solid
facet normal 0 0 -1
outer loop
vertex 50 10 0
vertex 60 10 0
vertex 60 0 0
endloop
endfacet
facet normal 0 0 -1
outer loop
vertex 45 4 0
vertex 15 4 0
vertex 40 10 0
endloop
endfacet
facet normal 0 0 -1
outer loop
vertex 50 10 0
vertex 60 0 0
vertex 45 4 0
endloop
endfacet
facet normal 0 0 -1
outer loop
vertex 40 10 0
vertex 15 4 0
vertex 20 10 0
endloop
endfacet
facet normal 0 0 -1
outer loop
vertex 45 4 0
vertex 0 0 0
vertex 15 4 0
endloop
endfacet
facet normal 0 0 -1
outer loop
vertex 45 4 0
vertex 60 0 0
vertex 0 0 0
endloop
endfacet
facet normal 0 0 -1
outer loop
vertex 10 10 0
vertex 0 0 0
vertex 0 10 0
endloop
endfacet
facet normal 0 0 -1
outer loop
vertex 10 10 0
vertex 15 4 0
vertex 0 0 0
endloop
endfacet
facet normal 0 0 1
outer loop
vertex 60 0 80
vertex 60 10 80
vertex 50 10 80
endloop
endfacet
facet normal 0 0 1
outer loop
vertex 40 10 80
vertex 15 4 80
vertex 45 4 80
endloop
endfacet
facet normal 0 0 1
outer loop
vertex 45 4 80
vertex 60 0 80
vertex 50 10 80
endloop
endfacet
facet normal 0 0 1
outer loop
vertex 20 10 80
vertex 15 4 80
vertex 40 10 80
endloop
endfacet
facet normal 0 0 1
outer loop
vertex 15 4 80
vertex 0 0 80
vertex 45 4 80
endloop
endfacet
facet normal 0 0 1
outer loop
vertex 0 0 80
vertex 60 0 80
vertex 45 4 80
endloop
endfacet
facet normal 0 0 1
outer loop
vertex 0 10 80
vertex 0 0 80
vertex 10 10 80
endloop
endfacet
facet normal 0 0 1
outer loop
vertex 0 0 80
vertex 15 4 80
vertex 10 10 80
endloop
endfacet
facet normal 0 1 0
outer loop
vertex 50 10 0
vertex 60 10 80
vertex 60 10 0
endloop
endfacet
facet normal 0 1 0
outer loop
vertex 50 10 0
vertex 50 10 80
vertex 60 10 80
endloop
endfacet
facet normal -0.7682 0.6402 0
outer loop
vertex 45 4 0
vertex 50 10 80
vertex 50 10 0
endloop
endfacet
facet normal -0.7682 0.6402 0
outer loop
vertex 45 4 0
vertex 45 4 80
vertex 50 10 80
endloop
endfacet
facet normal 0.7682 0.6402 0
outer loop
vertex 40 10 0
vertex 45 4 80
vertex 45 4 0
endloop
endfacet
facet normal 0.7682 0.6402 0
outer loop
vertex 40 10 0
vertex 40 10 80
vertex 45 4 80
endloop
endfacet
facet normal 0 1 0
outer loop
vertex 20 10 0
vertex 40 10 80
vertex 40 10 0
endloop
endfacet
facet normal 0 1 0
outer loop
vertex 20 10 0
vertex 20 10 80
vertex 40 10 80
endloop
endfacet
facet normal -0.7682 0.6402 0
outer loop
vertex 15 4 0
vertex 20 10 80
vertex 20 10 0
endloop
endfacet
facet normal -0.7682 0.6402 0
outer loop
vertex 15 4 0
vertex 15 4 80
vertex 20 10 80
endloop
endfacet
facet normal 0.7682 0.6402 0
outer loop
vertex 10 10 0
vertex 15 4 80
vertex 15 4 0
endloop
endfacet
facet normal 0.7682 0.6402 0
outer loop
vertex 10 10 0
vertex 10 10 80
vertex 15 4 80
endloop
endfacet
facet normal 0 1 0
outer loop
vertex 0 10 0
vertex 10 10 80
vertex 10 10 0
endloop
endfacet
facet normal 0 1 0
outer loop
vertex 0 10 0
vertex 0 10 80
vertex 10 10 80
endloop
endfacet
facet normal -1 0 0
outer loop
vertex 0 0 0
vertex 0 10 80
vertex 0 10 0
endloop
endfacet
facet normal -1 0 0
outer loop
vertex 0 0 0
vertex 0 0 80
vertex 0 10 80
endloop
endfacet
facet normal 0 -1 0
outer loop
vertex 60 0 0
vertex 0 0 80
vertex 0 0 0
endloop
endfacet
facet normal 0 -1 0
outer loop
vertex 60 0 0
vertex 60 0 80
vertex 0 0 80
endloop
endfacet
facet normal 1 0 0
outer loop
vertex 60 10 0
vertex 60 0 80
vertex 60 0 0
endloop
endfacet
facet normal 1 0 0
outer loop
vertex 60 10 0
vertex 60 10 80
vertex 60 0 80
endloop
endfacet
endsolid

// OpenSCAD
$fn = 32;

// ----------------------------------------------------------------------
// V guide rail: doublev, 60 mm wide
// ----------------------------------------------------------------------

// --- parameters (mm) ---
rail_w = 60;              // rail width, X
base_t = 10;              // base plate thickness
v_depth = 6;              // V feature depth / height
v_half_w = 10;            // half width of the V at the base face
plate_t = 80;             // rail length, Z (the extrusion height)
groove_off = 15;          // offset of each groove from the centreline

centre_x = rail_w / 2;  // rail centreline
groove_a = centre_x - groove_off;  // axis of the first groove
groove_b = centre_x + groove_off;  // axis of the second groove

profile = [[0, 0], [60, 0], [60, 10], [50, 10], [45, 4], [40, 10], [20, 10], [15, 4], [10, 10], [0, 10]];  // primary outline, 10 points, counter clockwise

// --- the one profile operation ---
linear_extrude(height = plate_t) polygon(points = profile);
